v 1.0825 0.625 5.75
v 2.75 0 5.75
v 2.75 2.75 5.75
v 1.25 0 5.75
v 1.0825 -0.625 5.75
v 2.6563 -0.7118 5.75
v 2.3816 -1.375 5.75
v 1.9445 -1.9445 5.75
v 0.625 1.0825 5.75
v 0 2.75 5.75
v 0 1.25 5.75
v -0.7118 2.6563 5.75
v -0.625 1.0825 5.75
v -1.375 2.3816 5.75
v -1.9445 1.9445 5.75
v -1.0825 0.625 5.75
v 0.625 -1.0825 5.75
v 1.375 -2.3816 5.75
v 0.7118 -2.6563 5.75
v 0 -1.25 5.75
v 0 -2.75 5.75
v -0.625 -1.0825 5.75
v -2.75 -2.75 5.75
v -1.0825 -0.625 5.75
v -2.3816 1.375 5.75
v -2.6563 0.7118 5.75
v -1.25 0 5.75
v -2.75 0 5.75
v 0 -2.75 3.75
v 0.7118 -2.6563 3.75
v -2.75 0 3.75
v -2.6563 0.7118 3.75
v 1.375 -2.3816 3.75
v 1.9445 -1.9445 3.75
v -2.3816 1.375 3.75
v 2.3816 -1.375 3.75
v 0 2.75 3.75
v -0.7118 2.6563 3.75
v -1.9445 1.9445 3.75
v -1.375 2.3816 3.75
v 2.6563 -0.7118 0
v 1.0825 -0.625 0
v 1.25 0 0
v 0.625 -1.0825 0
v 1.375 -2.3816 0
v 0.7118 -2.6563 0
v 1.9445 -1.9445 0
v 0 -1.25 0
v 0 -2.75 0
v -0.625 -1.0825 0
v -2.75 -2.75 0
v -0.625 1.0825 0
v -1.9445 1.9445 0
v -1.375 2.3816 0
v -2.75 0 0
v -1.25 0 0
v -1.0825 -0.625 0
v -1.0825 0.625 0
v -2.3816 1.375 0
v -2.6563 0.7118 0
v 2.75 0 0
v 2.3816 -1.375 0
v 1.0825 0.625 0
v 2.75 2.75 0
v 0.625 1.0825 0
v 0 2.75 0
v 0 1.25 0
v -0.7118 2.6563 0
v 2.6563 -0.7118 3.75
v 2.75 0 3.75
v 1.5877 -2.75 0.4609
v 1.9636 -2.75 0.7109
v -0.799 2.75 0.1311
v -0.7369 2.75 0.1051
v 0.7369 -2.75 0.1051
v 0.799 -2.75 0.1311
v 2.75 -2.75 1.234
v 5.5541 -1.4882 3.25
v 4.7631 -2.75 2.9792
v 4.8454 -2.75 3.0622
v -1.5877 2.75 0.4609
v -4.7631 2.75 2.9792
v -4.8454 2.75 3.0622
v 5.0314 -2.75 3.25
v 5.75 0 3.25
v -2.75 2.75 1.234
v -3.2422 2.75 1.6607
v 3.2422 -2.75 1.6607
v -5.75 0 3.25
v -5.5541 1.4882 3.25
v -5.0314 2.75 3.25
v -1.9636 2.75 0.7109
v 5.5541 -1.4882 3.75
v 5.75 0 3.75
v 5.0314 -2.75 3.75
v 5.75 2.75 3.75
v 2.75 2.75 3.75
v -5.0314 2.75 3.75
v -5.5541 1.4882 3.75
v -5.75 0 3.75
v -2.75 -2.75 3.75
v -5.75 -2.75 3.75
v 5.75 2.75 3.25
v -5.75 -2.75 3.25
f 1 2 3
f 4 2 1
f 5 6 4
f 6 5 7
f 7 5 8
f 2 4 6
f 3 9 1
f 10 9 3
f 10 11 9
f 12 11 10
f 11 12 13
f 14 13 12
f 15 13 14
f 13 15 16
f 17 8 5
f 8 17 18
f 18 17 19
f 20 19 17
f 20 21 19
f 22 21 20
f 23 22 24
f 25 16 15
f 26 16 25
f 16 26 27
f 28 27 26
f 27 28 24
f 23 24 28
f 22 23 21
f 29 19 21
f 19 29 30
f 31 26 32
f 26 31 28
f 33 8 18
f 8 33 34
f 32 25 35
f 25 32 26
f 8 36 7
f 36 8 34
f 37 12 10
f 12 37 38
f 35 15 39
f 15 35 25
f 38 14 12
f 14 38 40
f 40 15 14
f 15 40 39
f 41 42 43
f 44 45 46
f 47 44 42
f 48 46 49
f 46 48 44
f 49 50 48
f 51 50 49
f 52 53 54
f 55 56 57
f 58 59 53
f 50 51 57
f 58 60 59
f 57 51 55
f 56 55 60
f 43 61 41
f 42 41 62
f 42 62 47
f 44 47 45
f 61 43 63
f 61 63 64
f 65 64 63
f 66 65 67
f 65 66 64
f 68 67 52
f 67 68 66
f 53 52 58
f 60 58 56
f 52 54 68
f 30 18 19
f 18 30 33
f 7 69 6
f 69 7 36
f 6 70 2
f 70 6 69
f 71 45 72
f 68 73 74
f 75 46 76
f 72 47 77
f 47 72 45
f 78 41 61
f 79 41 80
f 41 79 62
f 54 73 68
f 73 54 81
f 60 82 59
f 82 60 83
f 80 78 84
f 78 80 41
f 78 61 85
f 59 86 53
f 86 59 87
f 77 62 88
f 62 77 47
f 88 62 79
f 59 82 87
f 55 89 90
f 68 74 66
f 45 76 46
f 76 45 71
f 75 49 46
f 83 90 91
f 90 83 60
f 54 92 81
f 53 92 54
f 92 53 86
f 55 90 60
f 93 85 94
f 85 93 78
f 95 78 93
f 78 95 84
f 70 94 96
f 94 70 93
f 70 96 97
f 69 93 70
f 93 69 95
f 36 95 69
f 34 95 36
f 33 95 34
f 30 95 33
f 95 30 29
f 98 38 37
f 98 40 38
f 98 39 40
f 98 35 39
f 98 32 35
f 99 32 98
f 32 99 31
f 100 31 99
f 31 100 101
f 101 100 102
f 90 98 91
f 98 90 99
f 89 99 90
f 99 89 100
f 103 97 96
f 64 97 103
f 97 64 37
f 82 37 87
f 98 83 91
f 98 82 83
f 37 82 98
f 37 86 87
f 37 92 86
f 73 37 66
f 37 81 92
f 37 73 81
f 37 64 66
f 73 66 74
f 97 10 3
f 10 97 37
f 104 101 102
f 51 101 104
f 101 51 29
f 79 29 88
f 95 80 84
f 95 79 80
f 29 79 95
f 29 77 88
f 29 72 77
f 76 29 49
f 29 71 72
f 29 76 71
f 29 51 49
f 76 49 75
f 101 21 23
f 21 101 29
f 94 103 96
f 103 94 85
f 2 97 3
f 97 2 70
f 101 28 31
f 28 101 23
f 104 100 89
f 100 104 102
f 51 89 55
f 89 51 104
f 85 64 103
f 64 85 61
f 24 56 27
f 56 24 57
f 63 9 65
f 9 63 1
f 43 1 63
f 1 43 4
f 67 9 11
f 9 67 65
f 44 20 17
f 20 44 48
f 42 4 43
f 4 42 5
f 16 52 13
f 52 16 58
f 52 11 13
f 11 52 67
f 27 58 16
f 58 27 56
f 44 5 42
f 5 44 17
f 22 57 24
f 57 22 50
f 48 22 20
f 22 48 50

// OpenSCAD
/* Printable hammer-style t-nut by Tomi T. Salo <ttsalo@iki.fi> 2013 */

slot_depth = 6;
slot_width = 6;
slot_total_width = 12;
slot_bottom_width = 6;
slot_lip = 2;
slot_shoulder = 0.5;
tol = 0.25;

module rect_nut(length) {
  translate([0, length/2, 0])
    rotate([90, 0, 0])
      linear_extrude(height=length)
        polygon([[-slot_width/2 + tol, slot_depth - tol], 
                 [slot_width/2 - tol, slot_depth - tol], 
                 [slot_width/2 - tol, slot_depth - slot_lip - tol],
                 [slot_total_width/2 - tol, slot_depth - slot_lip - tol],
                 [slot_total_width/2 - tol, 
                  slot_depth - slot_lip - slot_shoulder - tol],
                 [slot_bottom_width/2 - tol, 0],
                 [- slot_bottom_width/2 + tol, 0],
                 [- slot_total_width/2 + tol, 
                  slot_depth - slot_lip - slot_shoulder - tol],
                 [- slot_total_width/2 + tol, slot_depth - slot_lip - tol],
                 [- slot_width/2 + tol, slot_depth - slot_lip - tol],
                 ]);
}

module round_nut() {
  cylinder(r=slot_width/2-tol, h=slot_depth - tol, $fn=24);
  cylinder(r1=slot_bottom_width/2-tol, r2=slot_total_width/2-tol, 
           h=slot_depth - slot_lip - slot_shoulder - tol, $fn=24);
  translate([0, 0, slot_depth - slot_lip - slot_shoulder - tol])
  cylinder(r=slot_total_width/2-tol, 
           h=slot_shoulder, $fn=24);
}

module hammer_nut(hole_r=0) {
  intersection() {
    union () {
      round_nut();
      difference() {
        rect_nut(slot_width - 2*tol);
        translate([0, -slot_total_width, 0])
          cube([slot_total_width, slot_total_width, slot_depth]);
        translate([-slot_total_width, 0, 0])
          cube([slot_total_width, slot_total_width, slot_depth]);
      }
    }
    difference() {
      translate([- slot_total_width / 2, - (slot_width - tol*2) / 2, 0])
        cube([slot_total_width, slot_width - tol*2, slot_depth]);
      if (hole_r > 0) {
        cylinder(r=hole_r, h=slot_depth, $fn=12);
      }
    }
  }
}

hammer_nut(hole_r=1.25);
